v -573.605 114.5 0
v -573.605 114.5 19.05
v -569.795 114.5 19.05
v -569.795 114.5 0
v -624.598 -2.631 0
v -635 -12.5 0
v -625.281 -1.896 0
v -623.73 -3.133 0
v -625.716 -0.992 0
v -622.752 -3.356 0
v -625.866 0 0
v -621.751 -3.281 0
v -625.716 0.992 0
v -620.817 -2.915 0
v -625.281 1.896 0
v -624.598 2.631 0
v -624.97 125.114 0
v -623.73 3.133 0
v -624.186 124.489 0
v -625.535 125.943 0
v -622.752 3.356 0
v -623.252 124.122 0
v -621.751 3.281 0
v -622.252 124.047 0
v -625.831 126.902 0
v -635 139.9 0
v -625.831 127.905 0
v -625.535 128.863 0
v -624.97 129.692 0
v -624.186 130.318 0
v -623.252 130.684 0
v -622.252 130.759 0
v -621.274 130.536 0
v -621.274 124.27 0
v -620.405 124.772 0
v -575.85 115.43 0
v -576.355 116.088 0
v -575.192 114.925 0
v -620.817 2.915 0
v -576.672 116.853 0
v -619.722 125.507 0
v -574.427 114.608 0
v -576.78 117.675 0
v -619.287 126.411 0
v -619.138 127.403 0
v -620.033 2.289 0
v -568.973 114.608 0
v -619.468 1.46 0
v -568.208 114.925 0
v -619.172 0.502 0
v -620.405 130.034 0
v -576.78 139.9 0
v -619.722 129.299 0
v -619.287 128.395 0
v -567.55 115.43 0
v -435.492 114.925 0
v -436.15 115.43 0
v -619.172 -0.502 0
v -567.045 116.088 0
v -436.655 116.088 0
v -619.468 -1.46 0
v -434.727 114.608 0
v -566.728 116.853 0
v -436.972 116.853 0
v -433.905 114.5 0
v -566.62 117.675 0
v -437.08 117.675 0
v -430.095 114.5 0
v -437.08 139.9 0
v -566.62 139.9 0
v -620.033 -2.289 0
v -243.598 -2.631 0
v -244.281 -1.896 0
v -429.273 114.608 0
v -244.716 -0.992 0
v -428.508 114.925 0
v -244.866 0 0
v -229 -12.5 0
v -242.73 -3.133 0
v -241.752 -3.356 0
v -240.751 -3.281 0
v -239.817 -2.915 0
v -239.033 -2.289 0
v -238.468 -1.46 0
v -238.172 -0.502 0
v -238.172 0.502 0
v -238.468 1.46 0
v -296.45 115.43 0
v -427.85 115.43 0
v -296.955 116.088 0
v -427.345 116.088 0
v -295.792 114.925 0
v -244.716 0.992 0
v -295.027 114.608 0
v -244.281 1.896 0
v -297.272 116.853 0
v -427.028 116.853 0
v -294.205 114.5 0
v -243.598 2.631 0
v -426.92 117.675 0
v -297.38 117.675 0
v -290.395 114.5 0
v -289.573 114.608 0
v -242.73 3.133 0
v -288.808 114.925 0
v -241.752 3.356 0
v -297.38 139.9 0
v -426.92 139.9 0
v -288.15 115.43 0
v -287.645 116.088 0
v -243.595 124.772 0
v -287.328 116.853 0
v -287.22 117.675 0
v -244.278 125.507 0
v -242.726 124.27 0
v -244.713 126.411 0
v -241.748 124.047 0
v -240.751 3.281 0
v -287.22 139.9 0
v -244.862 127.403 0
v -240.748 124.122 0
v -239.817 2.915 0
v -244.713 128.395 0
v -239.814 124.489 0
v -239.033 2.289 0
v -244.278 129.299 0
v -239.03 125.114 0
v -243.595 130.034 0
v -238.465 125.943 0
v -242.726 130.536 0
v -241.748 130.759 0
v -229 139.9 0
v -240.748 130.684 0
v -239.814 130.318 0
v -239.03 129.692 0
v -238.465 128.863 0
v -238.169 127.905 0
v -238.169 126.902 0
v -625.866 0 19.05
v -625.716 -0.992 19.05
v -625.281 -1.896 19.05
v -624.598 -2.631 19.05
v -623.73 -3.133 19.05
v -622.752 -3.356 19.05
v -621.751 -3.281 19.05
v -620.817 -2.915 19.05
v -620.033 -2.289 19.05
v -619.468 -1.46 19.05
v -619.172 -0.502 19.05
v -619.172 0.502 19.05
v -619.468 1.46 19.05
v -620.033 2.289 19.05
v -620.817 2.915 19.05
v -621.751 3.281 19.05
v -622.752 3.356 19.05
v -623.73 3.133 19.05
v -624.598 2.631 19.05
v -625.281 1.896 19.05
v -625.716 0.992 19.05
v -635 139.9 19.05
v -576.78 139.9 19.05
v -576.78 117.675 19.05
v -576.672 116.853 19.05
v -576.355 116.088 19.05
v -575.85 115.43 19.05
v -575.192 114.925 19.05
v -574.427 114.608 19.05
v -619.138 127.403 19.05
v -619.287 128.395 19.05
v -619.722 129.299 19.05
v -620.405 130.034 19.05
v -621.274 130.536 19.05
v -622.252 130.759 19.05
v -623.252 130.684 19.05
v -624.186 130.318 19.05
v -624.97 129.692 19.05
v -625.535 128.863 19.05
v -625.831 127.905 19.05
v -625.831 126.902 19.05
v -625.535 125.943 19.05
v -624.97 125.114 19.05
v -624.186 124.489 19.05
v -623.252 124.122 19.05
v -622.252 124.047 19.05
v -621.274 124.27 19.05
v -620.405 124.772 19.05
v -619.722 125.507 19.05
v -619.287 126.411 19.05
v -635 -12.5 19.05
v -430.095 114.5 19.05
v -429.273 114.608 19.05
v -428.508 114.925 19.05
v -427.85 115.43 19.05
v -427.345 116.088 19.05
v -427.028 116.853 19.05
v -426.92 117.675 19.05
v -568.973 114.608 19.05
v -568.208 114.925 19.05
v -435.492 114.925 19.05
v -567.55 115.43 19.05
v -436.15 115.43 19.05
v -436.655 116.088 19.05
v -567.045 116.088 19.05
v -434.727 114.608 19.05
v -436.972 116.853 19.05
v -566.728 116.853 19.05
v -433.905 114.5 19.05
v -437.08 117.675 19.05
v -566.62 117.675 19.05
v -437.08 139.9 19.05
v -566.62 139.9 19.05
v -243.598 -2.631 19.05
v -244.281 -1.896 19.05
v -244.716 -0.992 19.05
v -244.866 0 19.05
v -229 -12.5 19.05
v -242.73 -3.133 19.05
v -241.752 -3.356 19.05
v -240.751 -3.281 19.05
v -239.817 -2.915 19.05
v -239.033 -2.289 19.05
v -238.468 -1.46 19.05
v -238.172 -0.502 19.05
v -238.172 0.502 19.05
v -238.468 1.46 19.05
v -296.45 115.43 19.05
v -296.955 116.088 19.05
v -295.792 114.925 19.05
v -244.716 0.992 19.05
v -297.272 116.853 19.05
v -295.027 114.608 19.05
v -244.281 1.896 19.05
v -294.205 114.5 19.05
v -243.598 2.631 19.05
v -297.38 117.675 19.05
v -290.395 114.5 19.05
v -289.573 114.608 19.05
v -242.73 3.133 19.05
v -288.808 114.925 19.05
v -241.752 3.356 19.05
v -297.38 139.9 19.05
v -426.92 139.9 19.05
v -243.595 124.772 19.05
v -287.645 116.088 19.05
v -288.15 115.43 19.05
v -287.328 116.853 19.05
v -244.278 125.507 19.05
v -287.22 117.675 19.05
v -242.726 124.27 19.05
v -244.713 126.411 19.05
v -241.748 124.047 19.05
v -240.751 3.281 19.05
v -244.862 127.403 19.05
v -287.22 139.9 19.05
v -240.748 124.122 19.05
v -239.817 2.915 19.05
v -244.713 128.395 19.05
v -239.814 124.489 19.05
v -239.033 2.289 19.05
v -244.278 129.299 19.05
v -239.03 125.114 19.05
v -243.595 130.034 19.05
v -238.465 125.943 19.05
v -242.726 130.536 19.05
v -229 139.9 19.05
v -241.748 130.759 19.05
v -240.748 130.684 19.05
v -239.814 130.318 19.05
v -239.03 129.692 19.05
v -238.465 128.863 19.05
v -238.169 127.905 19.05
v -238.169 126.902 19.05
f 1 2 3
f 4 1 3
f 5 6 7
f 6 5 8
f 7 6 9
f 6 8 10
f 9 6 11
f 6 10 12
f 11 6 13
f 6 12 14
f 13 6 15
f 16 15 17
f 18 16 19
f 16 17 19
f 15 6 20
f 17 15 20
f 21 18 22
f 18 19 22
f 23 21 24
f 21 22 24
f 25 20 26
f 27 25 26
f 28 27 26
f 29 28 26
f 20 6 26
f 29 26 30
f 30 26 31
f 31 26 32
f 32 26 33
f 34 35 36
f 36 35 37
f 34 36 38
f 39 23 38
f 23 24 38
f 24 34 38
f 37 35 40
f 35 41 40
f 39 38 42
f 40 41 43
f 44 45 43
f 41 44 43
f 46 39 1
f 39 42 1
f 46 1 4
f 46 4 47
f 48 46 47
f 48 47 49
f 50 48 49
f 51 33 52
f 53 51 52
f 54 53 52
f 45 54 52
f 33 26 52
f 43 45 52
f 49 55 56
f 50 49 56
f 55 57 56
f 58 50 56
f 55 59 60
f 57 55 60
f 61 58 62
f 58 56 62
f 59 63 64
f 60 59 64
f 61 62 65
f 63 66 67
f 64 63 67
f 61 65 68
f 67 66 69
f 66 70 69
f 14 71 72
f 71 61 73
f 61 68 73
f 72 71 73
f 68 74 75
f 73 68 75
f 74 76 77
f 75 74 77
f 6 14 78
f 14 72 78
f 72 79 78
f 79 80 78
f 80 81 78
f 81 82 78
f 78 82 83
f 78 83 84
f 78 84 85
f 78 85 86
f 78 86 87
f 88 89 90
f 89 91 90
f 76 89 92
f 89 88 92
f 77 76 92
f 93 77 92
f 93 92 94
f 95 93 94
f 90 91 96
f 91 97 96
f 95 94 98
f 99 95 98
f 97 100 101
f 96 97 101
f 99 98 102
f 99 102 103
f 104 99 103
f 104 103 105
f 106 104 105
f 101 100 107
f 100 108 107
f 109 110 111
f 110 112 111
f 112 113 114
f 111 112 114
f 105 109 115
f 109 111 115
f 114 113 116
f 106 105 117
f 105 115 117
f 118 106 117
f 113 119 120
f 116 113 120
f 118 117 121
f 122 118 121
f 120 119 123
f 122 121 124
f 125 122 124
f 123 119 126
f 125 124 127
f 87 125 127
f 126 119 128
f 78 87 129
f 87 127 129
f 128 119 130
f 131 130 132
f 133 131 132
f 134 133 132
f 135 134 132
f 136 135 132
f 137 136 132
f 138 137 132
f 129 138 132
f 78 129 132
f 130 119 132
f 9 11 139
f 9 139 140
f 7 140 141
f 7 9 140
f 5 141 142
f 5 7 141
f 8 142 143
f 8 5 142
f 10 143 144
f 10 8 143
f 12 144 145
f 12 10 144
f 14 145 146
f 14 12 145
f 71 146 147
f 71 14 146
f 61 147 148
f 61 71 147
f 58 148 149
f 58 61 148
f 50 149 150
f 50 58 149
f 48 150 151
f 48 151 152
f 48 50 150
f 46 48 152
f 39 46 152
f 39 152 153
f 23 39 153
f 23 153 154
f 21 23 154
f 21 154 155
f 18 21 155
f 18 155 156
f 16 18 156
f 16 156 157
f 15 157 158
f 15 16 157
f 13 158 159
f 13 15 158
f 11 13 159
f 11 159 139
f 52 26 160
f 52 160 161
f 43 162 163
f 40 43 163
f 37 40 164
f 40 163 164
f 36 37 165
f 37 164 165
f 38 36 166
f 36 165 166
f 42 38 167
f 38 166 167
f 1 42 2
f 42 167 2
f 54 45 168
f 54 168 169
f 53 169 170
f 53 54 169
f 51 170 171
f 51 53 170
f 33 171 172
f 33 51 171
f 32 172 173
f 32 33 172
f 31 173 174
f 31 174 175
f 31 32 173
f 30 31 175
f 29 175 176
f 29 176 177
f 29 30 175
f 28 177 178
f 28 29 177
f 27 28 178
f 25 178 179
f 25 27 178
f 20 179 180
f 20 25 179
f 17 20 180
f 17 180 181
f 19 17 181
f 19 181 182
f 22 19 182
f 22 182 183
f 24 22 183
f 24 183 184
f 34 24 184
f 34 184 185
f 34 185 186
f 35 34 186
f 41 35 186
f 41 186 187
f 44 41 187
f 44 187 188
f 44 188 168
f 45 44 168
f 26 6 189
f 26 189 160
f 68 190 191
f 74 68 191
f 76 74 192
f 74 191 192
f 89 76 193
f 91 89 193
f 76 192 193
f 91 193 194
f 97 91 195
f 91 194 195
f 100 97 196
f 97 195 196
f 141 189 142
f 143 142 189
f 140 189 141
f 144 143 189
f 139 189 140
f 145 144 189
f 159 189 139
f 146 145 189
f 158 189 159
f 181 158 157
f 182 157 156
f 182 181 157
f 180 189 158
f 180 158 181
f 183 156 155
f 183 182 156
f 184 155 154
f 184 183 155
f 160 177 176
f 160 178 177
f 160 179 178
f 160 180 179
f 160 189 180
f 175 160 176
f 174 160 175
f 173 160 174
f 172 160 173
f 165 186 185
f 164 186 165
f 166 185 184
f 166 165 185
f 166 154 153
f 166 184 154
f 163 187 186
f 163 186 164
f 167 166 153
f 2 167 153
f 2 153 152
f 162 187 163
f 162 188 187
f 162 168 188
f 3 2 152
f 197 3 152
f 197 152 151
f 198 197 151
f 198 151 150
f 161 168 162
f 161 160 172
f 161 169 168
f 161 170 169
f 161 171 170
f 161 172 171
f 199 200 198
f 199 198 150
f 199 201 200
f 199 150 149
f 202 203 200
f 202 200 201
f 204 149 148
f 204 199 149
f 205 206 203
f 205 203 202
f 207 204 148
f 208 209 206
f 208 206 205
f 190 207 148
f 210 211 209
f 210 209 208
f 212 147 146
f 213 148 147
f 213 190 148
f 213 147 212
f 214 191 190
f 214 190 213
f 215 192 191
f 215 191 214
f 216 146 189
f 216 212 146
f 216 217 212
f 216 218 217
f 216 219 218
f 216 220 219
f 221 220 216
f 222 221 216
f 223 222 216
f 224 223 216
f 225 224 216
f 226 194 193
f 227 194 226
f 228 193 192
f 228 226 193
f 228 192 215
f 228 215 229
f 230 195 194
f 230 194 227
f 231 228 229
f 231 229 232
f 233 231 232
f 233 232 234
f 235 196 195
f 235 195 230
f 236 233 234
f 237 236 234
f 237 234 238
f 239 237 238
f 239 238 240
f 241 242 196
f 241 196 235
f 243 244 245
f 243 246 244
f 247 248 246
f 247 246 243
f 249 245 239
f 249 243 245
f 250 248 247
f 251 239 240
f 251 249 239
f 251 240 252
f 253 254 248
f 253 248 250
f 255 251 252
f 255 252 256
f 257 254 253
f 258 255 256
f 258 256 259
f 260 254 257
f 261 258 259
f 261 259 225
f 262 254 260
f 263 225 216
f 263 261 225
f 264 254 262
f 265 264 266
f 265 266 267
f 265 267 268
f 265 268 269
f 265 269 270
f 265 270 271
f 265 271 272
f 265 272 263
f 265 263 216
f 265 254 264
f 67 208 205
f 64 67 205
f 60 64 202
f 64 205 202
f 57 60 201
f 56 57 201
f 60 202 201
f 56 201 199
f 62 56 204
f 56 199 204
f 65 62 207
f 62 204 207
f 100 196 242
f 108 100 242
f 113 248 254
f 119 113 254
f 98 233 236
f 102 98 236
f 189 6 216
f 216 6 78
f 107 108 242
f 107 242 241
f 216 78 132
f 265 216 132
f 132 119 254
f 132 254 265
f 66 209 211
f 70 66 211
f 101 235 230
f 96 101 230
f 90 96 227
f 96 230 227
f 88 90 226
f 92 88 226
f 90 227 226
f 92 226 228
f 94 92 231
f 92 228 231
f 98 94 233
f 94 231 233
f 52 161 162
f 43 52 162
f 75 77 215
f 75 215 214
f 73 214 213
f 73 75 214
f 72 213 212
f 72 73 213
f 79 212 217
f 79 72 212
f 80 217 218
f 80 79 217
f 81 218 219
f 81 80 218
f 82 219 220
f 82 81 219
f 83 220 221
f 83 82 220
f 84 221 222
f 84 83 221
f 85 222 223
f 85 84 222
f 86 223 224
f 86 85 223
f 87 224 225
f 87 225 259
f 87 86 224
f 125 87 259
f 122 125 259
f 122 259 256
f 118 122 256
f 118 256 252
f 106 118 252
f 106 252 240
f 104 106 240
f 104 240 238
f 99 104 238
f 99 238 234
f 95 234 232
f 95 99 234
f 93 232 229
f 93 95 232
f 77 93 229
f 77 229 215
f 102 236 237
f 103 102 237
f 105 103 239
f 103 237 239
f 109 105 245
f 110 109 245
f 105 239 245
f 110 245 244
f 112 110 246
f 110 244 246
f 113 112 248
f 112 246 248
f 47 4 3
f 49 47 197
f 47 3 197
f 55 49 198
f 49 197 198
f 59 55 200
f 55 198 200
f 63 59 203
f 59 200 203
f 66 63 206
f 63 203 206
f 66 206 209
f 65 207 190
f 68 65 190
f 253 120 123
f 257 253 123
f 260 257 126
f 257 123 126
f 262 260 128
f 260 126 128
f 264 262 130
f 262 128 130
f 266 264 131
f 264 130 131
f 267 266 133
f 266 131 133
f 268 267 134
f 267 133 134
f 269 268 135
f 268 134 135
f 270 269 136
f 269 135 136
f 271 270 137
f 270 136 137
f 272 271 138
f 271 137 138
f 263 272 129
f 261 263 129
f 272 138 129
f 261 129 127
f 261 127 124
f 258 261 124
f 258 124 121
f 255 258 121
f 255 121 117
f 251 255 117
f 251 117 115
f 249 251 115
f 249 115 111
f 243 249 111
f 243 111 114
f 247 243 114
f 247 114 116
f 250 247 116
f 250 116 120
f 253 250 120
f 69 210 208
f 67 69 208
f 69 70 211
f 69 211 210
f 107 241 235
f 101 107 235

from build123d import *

# Parameters (mm, degrees)
SKETCH1_W           = 406
SKETCH1_H           = 152.4
SKETCH1_R           = 3.3655
BOSS_EXTRUDE1_DEPTH = 19.05
SKETCH2_R           = 3.3655
CUT_EXTRUDE1_DEPTH  = 21.082
CUT_EXTRUDE2_DEPTH  = 651.507426937
LPATTERN1_COUNT     = 2
LPATTERN1_PITCH     = 139.7
LPATTERN1_COL_COUNT = 2
LPATTERN1_COL_PITCH = 139.7


with BuildPart() as part:
    # Sketch1 → Boss-Extrude1 (new body)
    with BuildSketch(Plane.XY):
        with Locations((-432, 63.7)):
            Rectangle(SKETCH1_W, SKETCH1_H)
        with Locations(Location((-241.5, 0, 0), (0, 0, 180))):
            Circle(SKETCH1_R, mode=Mode.SUBTRACT)
        with Locations(Location((-622.5, 0, 0), (0, 0, 180))):
            Circle(SKETCH1_R, mode=Mode.SUBTRACT)
    extrude(amount=BOSS_EXTRUDE1_DEPTH)

    # Sketch2 → Cut-Extrude1 (cut)
    with BuildSketch(Plane(origin=(-432, 23.6125, -2.032), x_dir=(-1, 0, 0), z_dir=(0, 0, -1))):
        with Locations((-190.5032, 103.7907)):
            Circle(SKETCH2_R)
    cut_extrude1 = extrude(amount=-CUT_EXTRUDE1_DEPTH, mode=Mode.SUBTRACT)

    # Mirror1: Cut-Extrude1 across plane
    add(cut_extrude1.mirror(Plane.ZY.offset(432)), mode=Mode.SUBTRACT)

    # Sketch4 → Cut-Extrude2 (cut, through all)
    with BuildSketch(Plane.XY.offset(19.05)):
        with BuildLine():
            Line((-433.905, 114.5), (-430.095, 114.5))
            ThreePointArc((-430.095, 114.5), (-427.84993597, 115.42993597), (-426.92, 117.675))
            Line((-426.92, 117.675), (-426.92, 139.9))
            Line((-426.92, 139.9), (-437.08, 139.9))
            Line((-437.08, 139.9), (-437.08, 117.675))
            ThreePointArc((-437.08, 117.675), (-436.15006403, 115.42993597), (-433.905, 114.5))
        make_face()
    cut_extrude2 = extrude(amount=-CUT_EXTRUDE2_DEPTH, mode=Mode.SUBTRACT)

    # LPattern1: Cut-Extrude2 ×2
    with Locations(*[(i * LPATTERN1_PITCH, 0, 0) for i in range(1, LPATTERN1_COUNT)]):
        add(cut_extrude2, mode=Mode.SUBTRACT)

    # LPattern1 col: Cut-Extrude2 ×2
    with Locations(*[(-i * LPATTERN1_COL_PITCH, 0, 0) for i in range(1, LPATTERN1_COL_COUNT)]):
        add(cut_extrude2, mode=Mode.SUBTRACT)


solid = part.part
